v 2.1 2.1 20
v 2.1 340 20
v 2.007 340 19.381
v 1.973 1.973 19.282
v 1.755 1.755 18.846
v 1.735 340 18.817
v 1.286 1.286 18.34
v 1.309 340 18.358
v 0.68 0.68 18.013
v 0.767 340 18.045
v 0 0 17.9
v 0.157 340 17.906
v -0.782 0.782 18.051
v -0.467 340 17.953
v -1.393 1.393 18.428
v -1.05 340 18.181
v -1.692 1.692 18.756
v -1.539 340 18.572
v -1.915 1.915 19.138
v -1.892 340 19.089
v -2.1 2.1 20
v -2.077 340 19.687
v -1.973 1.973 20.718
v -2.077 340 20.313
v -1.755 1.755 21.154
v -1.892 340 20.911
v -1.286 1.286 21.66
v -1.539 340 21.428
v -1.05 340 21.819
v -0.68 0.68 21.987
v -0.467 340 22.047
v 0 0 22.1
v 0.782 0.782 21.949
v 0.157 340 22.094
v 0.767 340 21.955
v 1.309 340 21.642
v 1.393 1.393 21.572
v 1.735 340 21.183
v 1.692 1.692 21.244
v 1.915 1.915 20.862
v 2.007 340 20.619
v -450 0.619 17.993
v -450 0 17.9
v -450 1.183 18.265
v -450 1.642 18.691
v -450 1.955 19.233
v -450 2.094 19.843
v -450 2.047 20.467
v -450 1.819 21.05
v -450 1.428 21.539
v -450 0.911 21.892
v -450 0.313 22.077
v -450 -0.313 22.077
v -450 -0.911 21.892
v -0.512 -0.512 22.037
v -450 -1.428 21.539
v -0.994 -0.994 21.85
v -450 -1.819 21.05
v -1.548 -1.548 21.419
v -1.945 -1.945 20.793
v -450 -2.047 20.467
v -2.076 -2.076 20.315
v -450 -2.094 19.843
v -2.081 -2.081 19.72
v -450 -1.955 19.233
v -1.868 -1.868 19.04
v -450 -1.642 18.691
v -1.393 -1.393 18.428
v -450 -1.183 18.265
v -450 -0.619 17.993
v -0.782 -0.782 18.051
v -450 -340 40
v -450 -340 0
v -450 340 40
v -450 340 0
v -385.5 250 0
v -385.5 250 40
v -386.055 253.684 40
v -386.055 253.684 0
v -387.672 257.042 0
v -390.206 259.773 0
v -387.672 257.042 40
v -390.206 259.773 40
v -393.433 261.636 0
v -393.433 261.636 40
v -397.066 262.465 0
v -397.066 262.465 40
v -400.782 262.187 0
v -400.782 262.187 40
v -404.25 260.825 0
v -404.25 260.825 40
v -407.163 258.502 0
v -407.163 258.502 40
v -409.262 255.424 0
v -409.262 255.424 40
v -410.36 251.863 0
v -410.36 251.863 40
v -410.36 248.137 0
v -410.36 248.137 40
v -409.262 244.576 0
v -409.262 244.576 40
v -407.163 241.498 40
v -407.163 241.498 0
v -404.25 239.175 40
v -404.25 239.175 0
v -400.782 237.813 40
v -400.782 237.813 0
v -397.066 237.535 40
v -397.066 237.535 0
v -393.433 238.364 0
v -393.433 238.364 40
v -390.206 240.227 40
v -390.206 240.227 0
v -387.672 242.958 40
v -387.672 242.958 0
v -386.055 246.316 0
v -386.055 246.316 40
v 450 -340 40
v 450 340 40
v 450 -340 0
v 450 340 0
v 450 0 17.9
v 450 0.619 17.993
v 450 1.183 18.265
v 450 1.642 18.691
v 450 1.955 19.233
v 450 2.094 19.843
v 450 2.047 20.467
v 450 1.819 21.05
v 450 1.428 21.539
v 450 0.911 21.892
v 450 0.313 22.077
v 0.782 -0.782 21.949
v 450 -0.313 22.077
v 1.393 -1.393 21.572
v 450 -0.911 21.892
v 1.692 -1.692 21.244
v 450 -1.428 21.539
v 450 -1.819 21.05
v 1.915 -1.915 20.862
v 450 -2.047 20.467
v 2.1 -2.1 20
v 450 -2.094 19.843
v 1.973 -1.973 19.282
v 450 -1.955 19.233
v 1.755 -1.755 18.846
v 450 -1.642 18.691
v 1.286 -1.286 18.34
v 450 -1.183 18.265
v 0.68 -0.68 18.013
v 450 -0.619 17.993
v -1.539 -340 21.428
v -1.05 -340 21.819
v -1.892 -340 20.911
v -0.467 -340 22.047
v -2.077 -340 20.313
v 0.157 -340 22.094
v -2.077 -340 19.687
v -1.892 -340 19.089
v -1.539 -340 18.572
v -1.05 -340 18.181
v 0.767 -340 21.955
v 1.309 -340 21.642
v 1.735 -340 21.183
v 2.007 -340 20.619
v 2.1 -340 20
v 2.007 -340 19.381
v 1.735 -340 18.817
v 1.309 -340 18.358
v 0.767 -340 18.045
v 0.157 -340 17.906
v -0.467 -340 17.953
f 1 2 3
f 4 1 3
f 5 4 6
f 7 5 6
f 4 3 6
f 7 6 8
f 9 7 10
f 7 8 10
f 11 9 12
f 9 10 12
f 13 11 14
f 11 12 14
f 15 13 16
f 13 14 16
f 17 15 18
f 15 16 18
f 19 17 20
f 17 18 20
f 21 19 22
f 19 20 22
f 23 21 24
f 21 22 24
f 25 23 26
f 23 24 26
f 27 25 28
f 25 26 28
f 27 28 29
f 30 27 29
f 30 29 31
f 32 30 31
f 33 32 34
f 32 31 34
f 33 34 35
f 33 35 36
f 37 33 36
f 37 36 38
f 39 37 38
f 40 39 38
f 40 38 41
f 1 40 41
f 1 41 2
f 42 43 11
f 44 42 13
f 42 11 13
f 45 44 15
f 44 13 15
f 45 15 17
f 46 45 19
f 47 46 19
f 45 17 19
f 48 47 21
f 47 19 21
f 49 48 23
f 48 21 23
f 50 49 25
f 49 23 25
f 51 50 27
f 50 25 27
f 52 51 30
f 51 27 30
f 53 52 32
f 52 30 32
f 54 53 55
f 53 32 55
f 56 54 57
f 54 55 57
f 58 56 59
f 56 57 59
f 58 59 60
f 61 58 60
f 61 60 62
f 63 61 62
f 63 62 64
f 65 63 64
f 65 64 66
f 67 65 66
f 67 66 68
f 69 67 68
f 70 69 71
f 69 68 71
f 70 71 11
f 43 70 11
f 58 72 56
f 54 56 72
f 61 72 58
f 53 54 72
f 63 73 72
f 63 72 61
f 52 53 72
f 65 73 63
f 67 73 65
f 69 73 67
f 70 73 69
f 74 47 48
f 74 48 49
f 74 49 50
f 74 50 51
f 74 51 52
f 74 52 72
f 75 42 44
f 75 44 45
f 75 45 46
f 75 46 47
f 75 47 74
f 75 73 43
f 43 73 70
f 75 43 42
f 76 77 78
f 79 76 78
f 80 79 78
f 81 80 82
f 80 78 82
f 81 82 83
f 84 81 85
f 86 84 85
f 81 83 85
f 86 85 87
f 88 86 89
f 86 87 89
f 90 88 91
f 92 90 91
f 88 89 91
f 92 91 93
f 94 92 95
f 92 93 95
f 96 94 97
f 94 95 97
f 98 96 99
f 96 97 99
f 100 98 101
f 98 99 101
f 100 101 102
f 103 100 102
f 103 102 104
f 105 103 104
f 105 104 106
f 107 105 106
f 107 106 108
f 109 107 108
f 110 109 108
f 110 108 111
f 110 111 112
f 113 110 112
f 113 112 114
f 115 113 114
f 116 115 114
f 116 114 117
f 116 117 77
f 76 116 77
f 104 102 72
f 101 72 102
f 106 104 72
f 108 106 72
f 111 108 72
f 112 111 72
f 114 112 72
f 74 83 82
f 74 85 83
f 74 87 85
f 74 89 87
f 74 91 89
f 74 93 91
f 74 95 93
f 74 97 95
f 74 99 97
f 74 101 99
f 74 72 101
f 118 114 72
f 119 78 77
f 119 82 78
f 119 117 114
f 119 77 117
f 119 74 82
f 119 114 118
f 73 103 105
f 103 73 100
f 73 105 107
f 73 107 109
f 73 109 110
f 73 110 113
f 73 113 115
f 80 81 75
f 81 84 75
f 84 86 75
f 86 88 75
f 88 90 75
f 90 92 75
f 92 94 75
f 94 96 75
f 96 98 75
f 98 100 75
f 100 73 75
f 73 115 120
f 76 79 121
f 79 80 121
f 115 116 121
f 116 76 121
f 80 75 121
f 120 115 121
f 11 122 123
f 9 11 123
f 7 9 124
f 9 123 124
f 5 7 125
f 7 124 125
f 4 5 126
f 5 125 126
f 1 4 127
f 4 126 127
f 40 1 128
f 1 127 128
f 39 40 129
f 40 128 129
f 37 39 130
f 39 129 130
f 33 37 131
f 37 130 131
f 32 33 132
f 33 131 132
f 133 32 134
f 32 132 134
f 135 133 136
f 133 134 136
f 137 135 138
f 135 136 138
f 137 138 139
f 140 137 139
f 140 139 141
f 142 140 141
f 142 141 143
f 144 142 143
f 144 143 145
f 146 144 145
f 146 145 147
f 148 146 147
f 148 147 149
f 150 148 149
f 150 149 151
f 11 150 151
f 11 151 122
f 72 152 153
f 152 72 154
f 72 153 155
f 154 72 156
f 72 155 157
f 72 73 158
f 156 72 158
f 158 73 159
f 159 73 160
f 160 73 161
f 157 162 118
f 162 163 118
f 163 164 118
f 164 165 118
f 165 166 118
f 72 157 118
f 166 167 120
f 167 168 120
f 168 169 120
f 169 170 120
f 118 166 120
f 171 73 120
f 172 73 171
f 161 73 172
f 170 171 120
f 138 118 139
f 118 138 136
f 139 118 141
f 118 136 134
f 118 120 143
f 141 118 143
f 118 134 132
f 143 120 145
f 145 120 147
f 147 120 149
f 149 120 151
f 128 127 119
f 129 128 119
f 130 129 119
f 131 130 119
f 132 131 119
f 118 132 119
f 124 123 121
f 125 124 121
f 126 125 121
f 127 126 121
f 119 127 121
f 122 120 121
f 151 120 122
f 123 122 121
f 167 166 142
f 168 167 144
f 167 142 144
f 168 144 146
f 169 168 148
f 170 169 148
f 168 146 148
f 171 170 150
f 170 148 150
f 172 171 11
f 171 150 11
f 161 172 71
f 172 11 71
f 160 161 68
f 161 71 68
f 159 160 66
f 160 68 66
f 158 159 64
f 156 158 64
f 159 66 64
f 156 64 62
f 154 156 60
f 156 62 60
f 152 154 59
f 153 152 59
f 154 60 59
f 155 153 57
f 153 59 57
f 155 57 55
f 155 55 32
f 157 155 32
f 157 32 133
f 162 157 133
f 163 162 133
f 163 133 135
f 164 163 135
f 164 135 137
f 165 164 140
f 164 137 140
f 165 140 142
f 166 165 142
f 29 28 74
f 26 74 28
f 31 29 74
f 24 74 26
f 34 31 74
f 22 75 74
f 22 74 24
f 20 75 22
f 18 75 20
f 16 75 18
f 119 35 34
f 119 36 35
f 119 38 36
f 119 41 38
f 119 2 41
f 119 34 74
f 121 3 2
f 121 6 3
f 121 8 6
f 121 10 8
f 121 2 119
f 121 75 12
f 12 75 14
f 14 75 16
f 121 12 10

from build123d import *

# Parameters (mm, degrees)
SKETCH_2_W          = 900
SKETCH_2_H          = 680
EXTRUDE_1_DEPTH     = 40
HOLE_WIZARD_M5_1_D  = 4.2
HOLE_WIZARD_M5_2_D  = 4.2
SKETCH_9_R          = 12.5
CUT_EXTRUDE_1_DEPTH = 566.420197729


with BuildPart() as part:
    # 草图2 → 凸台-拉伸1 (new body)
    with BuildSketch(Plane.XY):
        Rectangle(SKETCH_2_W, SKETCH_2_H)
    extrude(amount=EXTRUDE_1_DEPTH)

    # M5 螺纹孔1 (through all)
    with Locations(Plane(origin=(0, -340, 0), x_dir=(-1, 0, 0), z_dir=(0, -1, 0))):
        with Locations((0, -20)):
            Hole(HOLE_WIZARD_M5_1_D / 2)

    # M5 螺纹孔2 (through all)
    with Locations(Plane.ZY.offset(450)):
        with Locations((20, 0)):
            Hole(HOLE_WIZARD_M5_2_D / 2)

    # 草图9 → 切除-拉伸1 (cut, through all)
    with BuildSketch(Plane.XY.offset(40)):
        with Locations((-398, 250)):
            Circle(SKETCH_9_R)
    extrude(amount=-CUT_EXTRUDE_1_DEPTH, mode=Mode.SUBTRACT)


solid = part.part
